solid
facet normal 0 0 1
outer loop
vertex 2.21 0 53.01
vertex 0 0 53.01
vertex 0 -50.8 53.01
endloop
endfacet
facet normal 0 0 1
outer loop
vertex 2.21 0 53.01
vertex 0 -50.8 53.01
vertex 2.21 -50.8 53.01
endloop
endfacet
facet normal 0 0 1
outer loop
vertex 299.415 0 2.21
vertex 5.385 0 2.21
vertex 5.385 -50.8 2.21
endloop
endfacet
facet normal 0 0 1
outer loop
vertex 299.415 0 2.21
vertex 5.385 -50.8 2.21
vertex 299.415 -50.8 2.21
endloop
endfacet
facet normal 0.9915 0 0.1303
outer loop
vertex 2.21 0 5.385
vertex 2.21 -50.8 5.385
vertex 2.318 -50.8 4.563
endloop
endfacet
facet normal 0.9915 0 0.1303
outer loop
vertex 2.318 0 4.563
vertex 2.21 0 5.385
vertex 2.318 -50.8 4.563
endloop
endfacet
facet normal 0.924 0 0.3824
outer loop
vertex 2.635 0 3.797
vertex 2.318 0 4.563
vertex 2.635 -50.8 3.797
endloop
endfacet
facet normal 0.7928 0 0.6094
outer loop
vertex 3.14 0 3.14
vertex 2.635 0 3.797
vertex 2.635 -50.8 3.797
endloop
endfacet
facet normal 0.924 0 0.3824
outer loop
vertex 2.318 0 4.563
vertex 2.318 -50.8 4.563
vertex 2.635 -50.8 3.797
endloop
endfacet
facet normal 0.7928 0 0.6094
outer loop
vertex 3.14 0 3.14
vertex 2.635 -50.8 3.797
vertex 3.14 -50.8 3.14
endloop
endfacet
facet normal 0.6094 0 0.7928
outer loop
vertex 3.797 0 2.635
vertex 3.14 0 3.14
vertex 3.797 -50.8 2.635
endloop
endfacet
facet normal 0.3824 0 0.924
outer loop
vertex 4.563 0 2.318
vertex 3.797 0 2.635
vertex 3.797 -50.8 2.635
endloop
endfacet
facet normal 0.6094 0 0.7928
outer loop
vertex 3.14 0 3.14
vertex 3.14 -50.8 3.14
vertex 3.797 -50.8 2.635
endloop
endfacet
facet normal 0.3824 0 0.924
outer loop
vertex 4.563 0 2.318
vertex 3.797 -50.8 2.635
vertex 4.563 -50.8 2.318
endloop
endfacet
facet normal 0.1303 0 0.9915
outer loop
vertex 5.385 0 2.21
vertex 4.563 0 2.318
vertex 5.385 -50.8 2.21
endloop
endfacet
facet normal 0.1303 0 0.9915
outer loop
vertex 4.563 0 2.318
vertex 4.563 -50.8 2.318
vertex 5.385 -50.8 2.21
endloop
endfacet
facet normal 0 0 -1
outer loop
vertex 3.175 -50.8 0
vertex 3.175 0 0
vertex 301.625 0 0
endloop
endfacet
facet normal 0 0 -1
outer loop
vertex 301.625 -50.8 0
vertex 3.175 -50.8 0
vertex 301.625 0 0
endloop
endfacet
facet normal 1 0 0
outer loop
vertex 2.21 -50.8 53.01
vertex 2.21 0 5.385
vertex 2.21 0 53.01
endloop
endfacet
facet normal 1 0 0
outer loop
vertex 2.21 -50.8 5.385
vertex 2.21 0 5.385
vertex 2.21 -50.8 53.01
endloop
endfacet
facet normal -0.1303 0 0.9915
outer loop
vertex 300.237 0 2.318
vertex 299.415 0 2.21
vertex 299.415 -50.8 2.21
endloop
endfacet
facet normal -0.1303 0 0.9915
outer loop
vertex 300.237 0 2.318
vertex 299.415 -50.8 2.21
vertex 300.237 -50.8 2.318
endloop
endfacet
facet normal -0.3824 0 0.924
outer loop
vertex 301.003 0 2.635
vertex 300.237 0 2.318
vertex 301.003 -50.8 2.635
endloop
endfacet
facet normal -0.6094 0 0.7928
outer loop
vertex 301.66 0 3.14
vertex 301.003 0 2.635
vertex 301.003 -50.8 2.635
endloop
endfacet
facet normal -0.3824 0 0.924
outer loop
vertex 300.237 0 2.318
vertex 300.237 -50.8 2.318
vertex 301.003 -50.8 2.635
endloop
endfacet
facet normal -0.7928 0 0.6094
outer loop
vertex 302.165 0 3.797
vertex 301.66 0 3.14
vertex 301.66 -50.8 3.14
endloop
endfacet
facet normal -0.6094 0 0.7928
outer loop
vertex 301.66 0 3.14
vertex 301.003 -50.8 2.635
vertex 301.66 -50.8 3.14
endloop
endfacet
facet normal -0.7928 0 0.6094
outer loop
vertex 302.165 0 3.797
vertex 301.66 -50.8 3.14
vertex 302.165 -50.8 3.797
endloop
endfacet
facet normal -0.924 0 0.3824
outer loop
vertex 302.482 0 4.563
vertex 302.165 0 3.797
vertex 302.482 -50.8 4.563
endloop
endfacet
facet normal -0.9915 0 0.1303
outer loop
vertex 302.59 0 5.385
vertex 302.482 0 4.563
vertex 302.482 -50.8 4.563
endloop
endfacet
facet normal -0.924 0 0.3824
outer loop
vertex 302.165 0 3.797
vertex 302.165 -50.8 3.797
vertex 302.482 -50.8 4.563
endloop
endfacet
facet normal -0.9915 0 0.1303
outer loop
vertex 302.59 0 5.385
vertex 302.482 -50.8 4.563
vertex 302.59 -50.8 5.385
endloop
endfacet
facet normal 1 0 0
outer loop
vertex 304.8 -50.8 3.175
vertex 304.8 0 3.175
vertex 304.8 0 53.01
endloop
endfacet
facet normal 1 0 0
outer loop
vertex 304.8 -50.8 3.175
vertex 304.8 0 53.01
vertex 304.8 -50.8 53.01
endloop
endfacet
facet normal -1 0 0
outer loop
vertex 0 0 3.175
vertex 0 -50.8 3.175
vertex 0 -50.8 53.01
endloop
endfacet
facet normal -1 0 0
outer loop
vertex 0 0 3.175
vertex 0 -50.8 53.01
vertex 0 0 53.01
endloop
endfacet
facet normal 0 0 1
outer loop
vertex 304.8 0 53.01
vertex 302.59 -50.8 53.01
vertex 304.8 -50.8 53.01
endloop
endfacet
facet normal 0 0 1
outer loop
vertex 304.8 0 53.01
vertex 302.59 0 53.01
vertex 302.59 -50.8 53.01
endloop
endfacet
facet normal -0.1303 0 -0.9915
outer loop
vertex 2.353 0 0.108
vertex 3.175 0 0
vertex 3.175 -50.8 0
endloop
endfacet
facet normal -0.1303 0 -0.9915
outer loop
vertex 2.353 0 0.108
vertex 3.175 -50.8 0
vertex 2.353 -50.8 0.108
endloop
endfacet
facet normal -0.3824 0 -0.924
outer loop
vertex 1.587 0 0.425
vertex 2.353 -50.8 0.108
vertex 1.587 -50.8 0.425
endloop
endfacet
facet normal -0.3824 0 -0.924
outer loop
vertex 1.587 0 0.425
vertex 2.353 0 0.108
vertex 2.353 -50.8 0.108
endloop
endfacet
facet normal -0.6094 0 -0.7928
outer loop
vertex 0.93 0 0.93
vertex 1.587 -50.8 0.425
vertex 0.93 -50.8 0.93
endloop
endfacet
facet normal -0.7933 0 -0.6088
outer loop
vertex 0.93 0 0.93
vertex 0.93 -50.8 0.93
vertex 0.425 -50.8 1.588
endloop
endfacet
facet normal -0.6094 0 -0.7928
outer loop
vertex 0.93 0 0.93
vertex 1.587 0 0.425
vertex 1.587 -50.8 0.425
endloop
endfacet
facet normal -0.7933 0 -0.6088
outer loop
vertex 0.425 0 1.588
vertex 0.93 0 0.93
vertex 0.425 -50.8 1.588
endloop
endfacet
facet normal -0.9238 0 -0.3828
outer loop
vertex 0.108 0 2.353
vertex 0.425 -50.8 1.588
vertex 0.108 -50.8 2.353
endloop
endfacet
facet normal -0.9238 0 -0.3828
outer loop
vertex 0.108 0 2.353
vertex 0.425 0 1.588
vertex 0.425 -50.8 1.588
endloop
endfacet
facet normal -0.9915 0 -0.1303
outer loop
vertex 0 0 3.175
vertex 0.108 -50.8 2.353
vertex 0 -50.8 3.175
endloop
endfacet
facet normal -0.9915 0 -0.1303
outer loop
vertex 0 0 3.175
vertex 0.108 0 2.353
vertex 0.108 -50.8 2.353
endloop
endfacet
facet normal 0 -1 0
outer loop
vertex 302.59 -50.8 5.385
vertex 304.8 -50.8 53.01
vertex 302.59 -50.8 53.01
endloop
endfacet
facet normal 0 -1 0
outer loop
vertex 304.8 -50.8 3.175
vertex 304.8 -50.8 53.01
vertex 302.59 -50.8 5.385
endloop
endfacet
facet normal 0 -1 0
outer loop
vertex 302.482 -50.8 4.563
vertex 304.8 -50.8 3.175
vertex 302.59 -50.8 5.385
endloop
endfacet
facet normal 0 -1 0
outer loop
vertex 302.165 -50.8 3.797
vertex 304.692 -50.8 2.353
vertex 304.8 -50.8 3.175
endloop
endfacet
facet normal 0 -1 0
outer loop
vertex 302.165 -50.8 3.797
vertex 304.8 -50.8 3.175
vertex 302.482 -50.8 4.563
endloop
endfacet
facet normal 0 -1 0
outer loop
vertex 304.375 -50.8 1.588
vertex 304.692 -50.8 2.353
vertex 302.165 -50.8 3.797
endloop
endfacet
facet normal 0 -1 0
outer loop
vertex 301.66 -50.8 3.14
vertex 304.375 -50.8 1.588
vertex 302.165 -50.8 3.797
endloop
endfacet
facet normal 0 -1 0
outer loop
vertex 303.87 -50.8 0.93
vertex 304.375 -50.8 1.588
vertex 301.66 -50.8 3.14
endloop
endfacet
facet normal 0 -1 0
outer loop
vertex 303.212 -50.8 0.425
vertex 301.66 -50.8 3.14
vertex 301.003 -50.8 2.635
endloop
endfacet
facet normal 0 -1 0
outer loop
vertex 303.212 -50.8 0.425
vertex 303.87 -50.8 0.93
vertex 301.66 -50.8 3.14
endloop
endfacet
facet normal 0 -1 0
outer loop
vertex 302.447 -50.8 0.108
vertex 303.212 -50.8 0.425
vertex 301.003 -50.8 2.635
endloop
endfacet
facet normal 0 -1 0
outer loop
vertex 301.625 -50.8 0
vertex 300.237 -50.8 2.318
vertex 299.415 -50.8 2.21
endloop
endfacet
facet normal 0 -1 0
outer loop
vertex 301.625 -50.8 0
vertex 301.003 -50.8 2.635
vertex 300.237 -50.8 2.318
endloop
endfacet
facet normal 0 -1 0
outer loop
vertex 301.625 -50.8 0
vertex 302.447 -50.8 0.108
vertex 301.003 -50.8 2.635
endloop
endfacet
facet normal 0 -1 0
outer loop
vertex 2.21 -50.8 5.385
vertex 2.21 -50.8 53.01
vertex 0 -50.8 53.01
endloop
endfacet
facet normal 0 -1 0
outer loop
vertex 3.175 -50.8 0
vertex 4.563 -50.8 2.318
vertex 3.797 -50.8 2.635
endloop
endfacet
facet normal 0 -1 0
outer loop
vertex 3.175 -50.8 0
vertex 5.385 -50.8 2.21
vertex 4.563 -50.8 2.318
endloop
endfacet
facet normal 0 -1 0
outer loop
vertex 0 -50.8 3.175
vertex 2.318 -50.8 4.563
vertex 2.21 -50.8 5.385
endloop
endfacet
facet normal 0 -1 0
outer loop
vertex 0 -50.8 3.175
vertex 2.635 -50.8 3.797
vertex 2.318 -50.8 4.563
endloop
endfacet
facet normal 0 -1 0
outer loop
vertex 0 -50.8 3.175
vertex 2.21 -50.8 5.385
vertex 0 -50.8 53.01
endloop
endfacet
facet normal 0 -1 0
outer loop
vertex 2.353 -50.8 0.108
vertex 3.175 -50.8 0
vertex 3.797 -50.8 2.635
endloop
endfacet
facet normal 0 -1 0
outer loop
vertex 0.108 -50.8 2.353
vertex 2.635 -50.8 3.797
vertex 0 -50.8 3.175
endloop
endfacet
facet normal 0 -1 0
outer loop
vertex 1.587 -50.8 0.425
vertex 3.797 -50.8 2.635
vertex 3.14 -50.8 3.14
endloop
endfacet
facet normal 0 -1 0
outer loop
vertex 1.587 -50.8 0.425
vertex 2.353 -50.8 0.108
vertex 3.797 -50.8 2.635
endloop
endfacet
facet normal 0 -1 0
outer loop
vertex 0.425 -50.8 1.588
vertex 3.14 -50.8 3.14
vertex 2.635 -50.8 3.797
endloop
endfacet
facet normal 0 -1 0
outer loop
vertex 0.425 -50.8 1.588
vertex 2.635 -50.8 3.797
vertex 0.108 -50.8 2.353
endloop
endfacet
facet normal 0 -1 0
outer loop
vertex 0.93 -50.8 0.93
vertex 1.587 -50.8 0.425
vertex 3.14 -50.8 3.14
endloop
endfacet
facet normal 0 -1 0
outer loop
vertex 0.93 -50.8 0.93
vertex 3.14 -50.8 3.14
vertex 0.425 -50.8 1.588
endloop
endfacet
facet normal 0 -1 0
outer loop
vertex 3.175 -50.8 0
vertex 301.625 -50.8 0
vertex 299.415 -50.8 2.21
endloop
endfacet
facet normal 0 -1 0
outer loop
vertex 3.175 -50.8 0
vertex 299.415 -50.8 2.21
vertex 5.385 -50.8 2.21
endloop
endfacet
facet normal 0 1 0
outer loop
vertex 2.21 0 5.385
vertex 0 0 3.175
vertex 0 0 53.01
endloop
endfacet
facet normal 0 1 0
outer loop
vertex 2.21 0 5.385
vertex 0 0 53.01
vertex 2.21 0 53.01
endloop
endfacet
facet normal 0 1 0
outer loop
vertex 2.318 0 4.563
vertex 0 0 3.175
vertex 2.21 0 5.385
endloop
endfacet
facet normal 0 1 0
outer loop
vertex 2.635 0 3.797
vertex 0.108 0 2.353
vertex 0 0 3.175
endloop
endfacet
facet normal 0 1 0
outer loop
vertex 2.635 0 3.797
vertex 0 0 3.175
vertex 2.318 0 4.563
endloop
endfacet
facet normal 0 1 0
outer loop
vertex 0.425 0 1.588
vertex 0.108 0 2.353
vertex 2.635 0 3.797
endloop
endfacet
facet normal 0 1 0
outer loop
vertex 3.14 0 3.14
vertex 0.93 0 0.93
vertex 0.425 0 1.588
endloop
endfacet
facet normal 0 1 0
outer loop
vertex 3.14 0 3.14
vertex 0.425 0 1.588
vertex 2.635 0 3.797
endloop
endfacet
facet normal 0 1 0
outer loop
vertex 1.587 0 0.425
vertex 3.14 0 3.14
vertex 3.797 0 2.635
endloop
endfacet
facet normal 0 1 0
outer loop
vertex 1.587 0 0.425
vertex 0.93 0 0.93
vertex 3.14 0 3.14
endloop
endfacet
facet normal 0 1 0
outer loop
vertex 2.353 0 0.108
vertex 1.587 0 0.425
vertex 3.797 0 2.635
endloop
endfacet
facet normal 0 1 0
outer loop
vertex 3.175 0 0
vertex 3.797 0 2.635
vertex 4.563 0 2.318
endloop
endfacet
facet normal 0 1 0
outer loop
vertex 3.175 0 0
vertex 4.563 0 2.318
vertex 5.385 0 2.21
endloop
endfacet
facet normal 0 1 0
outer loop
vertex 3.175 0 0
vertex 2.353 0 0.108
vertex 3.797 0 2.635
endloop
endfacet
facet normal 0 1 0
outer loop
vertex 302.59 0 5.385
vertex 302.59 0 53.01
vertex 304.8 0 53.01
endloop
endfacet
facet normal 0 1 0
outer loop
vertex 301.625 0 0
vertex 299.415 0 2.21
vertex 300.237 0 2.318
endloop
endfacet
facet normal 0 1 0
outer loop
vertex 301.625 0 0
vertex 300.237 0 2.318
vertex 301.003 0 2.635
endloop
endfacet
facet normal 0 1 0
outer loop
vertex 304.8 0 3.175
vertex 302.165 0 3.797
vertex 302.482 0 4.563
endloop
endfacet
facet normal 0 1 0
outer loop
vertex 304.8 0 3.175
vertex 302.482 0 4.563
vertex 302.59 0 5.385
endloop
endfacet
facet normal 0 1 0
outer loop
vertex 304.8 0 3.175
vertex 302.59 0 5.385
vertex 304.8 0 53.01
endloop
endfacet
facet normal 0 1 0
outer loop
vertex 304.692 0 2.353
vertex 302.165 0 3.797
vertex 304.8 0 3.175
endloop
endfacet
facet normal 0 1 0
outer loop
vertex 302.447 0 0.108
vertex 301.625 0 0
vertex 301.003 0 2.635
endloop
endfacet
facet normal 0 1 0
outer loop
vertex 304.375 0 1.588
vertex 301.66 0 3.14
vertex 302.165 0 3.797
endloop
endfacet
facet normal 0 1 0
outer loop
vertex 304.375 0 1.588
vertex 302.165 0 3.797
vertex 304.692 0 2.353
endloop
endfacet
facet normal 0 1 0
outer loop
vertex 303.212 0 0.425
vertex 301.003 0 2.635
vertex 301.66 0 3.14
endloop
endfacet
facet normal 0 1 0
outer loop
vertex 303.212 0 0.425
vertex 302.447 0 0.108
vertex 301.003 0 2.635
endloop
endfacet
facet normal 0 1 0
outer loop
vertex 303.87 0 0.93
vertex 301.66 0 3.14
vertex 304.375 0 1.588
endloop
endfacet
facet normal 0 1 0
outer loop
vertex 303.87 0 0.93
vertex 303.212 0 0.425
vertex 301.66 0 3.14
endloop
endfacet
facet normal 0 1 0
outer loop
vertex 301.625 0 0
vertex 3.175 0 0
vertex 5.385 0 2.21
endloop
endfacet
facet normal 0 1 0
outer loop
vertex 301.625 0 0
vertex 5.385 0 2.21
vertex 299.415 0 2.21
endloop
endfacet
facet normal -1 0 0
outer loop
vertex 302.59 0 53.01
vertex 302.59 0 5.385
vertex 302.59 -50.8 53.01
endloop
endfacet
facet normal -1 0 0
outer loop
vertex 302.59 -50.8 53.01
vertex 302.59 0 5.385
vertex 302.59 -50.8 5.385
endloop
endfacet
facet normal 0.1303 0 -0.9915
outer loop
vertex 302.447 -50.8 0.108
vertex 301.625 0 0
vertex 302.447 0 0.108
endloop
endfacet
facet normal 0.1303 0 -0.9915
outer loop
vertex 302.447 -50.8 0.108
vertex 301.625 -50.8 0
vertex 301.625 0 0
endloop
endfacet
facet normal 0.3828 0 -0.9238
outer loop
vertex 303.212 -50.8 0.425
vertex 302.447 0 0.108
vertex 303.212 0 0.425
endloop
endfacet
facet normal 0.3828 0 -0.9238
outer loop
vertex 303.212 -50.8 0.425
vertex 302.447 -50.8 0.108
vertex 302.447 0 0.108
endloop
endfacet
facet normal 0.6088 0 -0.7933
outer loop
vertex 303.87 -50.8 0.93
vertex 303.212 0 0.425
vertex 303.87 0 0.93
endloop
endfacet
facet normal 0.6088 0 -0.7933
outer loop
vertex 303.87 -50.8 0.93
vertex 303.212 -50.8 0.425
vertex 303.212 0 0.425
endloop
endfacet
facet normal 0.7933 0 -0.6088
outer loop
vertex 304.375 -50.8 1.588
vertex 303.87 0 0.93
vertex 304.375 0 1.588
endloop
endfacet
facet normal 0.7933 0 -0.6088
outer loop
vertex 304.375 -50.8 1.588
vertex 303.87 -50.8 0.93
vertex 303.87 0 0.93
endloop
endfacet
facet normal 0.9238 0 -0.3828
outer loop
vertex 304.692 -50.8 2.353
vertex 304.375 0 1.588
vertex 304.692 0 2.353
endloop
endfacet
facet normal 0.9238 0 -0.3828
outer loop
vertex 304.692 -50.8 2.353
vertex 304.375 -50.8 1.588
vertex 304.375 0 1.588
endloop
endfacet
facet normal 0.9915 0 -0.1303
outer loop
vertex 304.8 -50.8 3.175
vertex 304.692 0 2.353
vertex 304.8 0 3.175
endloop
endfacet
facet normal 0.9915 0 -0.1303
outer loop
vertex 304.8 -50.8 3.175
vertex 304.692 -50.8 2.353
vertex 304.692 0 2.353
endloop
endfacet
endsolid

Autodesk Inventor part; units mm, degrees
ref_plane "YZ Plane" through (0, 0, 0) normal (1, 0, 0) x (0, 1, 0)
ref_plane "XZ Plane" through (0, 0, 0) normal (0, 1, 0) x (-1, 0, 0)
ref_plane "XY Plane" through (0, 0, 0) normal (0, 0, 1) x (1, 0, 0)
sketch "Sketch1" plane through (0, 0, 0) normal (0, 0, 1) x (1, 0, 0)
  line L0 (0, 0) -> (304.8, 0)
  line L1 (304.8, 0) -> (304.8, -50.8)
  line L2 (304.8, -50.8) -> (0, -50.8)
  line L3 (0, -50.8) -> (0, 0)
  dimension "d0" = 304.8
  dimension "d1" = 50.8
extrude "Extrusion1" add sketch "Sketch1" along normal blind 2.2098
sketch "Sketch2" plane through (0, 0, 2.2098) normal (0, 0, 1) x (1, 0, 0)
  line L0 (0, -50.8) -> (304.8, -50.8) projected
  line L1 (0, 0) -> (2.2098, 0)
  line L2 (2.2098, 0) -> (2.2098, -50.8)
  line L3 (2.2098, -50.8) -> (0, -50.8)
  line L4 (0, -50.8) -> (0, 0)
  line L5 (304.8, 0) -> (302.5902, 0)
  line L6 (302.5902, 0) -> (302.5902, -50.8)
  line L7 (302.5902, -50.8) -> (304.8, -50.8)
  line L8 (304.8, -50.8) -> (304.8, 0)
  dimension "d4" = 2.2098
  dimension "d5" = 2.2098
extrude "Extrusion2" add sketch "Sketch2" along normal blind 50.8
fillet "Fillet1" radius 3.175 1 edges at (304.8, -25.4, 0)
fillet "Fillet2" radius 3.175 1 edges at (0, -25.4, 0)
fillet "Fillet3" radius 3.175 1 edges at (2.2098, -25.4, 2.2098)
fillet "Fillet4" radius 3.175 1 edges at (302.5902, -25.4, 2.2098)
properties part number "Conveyor Brace"
